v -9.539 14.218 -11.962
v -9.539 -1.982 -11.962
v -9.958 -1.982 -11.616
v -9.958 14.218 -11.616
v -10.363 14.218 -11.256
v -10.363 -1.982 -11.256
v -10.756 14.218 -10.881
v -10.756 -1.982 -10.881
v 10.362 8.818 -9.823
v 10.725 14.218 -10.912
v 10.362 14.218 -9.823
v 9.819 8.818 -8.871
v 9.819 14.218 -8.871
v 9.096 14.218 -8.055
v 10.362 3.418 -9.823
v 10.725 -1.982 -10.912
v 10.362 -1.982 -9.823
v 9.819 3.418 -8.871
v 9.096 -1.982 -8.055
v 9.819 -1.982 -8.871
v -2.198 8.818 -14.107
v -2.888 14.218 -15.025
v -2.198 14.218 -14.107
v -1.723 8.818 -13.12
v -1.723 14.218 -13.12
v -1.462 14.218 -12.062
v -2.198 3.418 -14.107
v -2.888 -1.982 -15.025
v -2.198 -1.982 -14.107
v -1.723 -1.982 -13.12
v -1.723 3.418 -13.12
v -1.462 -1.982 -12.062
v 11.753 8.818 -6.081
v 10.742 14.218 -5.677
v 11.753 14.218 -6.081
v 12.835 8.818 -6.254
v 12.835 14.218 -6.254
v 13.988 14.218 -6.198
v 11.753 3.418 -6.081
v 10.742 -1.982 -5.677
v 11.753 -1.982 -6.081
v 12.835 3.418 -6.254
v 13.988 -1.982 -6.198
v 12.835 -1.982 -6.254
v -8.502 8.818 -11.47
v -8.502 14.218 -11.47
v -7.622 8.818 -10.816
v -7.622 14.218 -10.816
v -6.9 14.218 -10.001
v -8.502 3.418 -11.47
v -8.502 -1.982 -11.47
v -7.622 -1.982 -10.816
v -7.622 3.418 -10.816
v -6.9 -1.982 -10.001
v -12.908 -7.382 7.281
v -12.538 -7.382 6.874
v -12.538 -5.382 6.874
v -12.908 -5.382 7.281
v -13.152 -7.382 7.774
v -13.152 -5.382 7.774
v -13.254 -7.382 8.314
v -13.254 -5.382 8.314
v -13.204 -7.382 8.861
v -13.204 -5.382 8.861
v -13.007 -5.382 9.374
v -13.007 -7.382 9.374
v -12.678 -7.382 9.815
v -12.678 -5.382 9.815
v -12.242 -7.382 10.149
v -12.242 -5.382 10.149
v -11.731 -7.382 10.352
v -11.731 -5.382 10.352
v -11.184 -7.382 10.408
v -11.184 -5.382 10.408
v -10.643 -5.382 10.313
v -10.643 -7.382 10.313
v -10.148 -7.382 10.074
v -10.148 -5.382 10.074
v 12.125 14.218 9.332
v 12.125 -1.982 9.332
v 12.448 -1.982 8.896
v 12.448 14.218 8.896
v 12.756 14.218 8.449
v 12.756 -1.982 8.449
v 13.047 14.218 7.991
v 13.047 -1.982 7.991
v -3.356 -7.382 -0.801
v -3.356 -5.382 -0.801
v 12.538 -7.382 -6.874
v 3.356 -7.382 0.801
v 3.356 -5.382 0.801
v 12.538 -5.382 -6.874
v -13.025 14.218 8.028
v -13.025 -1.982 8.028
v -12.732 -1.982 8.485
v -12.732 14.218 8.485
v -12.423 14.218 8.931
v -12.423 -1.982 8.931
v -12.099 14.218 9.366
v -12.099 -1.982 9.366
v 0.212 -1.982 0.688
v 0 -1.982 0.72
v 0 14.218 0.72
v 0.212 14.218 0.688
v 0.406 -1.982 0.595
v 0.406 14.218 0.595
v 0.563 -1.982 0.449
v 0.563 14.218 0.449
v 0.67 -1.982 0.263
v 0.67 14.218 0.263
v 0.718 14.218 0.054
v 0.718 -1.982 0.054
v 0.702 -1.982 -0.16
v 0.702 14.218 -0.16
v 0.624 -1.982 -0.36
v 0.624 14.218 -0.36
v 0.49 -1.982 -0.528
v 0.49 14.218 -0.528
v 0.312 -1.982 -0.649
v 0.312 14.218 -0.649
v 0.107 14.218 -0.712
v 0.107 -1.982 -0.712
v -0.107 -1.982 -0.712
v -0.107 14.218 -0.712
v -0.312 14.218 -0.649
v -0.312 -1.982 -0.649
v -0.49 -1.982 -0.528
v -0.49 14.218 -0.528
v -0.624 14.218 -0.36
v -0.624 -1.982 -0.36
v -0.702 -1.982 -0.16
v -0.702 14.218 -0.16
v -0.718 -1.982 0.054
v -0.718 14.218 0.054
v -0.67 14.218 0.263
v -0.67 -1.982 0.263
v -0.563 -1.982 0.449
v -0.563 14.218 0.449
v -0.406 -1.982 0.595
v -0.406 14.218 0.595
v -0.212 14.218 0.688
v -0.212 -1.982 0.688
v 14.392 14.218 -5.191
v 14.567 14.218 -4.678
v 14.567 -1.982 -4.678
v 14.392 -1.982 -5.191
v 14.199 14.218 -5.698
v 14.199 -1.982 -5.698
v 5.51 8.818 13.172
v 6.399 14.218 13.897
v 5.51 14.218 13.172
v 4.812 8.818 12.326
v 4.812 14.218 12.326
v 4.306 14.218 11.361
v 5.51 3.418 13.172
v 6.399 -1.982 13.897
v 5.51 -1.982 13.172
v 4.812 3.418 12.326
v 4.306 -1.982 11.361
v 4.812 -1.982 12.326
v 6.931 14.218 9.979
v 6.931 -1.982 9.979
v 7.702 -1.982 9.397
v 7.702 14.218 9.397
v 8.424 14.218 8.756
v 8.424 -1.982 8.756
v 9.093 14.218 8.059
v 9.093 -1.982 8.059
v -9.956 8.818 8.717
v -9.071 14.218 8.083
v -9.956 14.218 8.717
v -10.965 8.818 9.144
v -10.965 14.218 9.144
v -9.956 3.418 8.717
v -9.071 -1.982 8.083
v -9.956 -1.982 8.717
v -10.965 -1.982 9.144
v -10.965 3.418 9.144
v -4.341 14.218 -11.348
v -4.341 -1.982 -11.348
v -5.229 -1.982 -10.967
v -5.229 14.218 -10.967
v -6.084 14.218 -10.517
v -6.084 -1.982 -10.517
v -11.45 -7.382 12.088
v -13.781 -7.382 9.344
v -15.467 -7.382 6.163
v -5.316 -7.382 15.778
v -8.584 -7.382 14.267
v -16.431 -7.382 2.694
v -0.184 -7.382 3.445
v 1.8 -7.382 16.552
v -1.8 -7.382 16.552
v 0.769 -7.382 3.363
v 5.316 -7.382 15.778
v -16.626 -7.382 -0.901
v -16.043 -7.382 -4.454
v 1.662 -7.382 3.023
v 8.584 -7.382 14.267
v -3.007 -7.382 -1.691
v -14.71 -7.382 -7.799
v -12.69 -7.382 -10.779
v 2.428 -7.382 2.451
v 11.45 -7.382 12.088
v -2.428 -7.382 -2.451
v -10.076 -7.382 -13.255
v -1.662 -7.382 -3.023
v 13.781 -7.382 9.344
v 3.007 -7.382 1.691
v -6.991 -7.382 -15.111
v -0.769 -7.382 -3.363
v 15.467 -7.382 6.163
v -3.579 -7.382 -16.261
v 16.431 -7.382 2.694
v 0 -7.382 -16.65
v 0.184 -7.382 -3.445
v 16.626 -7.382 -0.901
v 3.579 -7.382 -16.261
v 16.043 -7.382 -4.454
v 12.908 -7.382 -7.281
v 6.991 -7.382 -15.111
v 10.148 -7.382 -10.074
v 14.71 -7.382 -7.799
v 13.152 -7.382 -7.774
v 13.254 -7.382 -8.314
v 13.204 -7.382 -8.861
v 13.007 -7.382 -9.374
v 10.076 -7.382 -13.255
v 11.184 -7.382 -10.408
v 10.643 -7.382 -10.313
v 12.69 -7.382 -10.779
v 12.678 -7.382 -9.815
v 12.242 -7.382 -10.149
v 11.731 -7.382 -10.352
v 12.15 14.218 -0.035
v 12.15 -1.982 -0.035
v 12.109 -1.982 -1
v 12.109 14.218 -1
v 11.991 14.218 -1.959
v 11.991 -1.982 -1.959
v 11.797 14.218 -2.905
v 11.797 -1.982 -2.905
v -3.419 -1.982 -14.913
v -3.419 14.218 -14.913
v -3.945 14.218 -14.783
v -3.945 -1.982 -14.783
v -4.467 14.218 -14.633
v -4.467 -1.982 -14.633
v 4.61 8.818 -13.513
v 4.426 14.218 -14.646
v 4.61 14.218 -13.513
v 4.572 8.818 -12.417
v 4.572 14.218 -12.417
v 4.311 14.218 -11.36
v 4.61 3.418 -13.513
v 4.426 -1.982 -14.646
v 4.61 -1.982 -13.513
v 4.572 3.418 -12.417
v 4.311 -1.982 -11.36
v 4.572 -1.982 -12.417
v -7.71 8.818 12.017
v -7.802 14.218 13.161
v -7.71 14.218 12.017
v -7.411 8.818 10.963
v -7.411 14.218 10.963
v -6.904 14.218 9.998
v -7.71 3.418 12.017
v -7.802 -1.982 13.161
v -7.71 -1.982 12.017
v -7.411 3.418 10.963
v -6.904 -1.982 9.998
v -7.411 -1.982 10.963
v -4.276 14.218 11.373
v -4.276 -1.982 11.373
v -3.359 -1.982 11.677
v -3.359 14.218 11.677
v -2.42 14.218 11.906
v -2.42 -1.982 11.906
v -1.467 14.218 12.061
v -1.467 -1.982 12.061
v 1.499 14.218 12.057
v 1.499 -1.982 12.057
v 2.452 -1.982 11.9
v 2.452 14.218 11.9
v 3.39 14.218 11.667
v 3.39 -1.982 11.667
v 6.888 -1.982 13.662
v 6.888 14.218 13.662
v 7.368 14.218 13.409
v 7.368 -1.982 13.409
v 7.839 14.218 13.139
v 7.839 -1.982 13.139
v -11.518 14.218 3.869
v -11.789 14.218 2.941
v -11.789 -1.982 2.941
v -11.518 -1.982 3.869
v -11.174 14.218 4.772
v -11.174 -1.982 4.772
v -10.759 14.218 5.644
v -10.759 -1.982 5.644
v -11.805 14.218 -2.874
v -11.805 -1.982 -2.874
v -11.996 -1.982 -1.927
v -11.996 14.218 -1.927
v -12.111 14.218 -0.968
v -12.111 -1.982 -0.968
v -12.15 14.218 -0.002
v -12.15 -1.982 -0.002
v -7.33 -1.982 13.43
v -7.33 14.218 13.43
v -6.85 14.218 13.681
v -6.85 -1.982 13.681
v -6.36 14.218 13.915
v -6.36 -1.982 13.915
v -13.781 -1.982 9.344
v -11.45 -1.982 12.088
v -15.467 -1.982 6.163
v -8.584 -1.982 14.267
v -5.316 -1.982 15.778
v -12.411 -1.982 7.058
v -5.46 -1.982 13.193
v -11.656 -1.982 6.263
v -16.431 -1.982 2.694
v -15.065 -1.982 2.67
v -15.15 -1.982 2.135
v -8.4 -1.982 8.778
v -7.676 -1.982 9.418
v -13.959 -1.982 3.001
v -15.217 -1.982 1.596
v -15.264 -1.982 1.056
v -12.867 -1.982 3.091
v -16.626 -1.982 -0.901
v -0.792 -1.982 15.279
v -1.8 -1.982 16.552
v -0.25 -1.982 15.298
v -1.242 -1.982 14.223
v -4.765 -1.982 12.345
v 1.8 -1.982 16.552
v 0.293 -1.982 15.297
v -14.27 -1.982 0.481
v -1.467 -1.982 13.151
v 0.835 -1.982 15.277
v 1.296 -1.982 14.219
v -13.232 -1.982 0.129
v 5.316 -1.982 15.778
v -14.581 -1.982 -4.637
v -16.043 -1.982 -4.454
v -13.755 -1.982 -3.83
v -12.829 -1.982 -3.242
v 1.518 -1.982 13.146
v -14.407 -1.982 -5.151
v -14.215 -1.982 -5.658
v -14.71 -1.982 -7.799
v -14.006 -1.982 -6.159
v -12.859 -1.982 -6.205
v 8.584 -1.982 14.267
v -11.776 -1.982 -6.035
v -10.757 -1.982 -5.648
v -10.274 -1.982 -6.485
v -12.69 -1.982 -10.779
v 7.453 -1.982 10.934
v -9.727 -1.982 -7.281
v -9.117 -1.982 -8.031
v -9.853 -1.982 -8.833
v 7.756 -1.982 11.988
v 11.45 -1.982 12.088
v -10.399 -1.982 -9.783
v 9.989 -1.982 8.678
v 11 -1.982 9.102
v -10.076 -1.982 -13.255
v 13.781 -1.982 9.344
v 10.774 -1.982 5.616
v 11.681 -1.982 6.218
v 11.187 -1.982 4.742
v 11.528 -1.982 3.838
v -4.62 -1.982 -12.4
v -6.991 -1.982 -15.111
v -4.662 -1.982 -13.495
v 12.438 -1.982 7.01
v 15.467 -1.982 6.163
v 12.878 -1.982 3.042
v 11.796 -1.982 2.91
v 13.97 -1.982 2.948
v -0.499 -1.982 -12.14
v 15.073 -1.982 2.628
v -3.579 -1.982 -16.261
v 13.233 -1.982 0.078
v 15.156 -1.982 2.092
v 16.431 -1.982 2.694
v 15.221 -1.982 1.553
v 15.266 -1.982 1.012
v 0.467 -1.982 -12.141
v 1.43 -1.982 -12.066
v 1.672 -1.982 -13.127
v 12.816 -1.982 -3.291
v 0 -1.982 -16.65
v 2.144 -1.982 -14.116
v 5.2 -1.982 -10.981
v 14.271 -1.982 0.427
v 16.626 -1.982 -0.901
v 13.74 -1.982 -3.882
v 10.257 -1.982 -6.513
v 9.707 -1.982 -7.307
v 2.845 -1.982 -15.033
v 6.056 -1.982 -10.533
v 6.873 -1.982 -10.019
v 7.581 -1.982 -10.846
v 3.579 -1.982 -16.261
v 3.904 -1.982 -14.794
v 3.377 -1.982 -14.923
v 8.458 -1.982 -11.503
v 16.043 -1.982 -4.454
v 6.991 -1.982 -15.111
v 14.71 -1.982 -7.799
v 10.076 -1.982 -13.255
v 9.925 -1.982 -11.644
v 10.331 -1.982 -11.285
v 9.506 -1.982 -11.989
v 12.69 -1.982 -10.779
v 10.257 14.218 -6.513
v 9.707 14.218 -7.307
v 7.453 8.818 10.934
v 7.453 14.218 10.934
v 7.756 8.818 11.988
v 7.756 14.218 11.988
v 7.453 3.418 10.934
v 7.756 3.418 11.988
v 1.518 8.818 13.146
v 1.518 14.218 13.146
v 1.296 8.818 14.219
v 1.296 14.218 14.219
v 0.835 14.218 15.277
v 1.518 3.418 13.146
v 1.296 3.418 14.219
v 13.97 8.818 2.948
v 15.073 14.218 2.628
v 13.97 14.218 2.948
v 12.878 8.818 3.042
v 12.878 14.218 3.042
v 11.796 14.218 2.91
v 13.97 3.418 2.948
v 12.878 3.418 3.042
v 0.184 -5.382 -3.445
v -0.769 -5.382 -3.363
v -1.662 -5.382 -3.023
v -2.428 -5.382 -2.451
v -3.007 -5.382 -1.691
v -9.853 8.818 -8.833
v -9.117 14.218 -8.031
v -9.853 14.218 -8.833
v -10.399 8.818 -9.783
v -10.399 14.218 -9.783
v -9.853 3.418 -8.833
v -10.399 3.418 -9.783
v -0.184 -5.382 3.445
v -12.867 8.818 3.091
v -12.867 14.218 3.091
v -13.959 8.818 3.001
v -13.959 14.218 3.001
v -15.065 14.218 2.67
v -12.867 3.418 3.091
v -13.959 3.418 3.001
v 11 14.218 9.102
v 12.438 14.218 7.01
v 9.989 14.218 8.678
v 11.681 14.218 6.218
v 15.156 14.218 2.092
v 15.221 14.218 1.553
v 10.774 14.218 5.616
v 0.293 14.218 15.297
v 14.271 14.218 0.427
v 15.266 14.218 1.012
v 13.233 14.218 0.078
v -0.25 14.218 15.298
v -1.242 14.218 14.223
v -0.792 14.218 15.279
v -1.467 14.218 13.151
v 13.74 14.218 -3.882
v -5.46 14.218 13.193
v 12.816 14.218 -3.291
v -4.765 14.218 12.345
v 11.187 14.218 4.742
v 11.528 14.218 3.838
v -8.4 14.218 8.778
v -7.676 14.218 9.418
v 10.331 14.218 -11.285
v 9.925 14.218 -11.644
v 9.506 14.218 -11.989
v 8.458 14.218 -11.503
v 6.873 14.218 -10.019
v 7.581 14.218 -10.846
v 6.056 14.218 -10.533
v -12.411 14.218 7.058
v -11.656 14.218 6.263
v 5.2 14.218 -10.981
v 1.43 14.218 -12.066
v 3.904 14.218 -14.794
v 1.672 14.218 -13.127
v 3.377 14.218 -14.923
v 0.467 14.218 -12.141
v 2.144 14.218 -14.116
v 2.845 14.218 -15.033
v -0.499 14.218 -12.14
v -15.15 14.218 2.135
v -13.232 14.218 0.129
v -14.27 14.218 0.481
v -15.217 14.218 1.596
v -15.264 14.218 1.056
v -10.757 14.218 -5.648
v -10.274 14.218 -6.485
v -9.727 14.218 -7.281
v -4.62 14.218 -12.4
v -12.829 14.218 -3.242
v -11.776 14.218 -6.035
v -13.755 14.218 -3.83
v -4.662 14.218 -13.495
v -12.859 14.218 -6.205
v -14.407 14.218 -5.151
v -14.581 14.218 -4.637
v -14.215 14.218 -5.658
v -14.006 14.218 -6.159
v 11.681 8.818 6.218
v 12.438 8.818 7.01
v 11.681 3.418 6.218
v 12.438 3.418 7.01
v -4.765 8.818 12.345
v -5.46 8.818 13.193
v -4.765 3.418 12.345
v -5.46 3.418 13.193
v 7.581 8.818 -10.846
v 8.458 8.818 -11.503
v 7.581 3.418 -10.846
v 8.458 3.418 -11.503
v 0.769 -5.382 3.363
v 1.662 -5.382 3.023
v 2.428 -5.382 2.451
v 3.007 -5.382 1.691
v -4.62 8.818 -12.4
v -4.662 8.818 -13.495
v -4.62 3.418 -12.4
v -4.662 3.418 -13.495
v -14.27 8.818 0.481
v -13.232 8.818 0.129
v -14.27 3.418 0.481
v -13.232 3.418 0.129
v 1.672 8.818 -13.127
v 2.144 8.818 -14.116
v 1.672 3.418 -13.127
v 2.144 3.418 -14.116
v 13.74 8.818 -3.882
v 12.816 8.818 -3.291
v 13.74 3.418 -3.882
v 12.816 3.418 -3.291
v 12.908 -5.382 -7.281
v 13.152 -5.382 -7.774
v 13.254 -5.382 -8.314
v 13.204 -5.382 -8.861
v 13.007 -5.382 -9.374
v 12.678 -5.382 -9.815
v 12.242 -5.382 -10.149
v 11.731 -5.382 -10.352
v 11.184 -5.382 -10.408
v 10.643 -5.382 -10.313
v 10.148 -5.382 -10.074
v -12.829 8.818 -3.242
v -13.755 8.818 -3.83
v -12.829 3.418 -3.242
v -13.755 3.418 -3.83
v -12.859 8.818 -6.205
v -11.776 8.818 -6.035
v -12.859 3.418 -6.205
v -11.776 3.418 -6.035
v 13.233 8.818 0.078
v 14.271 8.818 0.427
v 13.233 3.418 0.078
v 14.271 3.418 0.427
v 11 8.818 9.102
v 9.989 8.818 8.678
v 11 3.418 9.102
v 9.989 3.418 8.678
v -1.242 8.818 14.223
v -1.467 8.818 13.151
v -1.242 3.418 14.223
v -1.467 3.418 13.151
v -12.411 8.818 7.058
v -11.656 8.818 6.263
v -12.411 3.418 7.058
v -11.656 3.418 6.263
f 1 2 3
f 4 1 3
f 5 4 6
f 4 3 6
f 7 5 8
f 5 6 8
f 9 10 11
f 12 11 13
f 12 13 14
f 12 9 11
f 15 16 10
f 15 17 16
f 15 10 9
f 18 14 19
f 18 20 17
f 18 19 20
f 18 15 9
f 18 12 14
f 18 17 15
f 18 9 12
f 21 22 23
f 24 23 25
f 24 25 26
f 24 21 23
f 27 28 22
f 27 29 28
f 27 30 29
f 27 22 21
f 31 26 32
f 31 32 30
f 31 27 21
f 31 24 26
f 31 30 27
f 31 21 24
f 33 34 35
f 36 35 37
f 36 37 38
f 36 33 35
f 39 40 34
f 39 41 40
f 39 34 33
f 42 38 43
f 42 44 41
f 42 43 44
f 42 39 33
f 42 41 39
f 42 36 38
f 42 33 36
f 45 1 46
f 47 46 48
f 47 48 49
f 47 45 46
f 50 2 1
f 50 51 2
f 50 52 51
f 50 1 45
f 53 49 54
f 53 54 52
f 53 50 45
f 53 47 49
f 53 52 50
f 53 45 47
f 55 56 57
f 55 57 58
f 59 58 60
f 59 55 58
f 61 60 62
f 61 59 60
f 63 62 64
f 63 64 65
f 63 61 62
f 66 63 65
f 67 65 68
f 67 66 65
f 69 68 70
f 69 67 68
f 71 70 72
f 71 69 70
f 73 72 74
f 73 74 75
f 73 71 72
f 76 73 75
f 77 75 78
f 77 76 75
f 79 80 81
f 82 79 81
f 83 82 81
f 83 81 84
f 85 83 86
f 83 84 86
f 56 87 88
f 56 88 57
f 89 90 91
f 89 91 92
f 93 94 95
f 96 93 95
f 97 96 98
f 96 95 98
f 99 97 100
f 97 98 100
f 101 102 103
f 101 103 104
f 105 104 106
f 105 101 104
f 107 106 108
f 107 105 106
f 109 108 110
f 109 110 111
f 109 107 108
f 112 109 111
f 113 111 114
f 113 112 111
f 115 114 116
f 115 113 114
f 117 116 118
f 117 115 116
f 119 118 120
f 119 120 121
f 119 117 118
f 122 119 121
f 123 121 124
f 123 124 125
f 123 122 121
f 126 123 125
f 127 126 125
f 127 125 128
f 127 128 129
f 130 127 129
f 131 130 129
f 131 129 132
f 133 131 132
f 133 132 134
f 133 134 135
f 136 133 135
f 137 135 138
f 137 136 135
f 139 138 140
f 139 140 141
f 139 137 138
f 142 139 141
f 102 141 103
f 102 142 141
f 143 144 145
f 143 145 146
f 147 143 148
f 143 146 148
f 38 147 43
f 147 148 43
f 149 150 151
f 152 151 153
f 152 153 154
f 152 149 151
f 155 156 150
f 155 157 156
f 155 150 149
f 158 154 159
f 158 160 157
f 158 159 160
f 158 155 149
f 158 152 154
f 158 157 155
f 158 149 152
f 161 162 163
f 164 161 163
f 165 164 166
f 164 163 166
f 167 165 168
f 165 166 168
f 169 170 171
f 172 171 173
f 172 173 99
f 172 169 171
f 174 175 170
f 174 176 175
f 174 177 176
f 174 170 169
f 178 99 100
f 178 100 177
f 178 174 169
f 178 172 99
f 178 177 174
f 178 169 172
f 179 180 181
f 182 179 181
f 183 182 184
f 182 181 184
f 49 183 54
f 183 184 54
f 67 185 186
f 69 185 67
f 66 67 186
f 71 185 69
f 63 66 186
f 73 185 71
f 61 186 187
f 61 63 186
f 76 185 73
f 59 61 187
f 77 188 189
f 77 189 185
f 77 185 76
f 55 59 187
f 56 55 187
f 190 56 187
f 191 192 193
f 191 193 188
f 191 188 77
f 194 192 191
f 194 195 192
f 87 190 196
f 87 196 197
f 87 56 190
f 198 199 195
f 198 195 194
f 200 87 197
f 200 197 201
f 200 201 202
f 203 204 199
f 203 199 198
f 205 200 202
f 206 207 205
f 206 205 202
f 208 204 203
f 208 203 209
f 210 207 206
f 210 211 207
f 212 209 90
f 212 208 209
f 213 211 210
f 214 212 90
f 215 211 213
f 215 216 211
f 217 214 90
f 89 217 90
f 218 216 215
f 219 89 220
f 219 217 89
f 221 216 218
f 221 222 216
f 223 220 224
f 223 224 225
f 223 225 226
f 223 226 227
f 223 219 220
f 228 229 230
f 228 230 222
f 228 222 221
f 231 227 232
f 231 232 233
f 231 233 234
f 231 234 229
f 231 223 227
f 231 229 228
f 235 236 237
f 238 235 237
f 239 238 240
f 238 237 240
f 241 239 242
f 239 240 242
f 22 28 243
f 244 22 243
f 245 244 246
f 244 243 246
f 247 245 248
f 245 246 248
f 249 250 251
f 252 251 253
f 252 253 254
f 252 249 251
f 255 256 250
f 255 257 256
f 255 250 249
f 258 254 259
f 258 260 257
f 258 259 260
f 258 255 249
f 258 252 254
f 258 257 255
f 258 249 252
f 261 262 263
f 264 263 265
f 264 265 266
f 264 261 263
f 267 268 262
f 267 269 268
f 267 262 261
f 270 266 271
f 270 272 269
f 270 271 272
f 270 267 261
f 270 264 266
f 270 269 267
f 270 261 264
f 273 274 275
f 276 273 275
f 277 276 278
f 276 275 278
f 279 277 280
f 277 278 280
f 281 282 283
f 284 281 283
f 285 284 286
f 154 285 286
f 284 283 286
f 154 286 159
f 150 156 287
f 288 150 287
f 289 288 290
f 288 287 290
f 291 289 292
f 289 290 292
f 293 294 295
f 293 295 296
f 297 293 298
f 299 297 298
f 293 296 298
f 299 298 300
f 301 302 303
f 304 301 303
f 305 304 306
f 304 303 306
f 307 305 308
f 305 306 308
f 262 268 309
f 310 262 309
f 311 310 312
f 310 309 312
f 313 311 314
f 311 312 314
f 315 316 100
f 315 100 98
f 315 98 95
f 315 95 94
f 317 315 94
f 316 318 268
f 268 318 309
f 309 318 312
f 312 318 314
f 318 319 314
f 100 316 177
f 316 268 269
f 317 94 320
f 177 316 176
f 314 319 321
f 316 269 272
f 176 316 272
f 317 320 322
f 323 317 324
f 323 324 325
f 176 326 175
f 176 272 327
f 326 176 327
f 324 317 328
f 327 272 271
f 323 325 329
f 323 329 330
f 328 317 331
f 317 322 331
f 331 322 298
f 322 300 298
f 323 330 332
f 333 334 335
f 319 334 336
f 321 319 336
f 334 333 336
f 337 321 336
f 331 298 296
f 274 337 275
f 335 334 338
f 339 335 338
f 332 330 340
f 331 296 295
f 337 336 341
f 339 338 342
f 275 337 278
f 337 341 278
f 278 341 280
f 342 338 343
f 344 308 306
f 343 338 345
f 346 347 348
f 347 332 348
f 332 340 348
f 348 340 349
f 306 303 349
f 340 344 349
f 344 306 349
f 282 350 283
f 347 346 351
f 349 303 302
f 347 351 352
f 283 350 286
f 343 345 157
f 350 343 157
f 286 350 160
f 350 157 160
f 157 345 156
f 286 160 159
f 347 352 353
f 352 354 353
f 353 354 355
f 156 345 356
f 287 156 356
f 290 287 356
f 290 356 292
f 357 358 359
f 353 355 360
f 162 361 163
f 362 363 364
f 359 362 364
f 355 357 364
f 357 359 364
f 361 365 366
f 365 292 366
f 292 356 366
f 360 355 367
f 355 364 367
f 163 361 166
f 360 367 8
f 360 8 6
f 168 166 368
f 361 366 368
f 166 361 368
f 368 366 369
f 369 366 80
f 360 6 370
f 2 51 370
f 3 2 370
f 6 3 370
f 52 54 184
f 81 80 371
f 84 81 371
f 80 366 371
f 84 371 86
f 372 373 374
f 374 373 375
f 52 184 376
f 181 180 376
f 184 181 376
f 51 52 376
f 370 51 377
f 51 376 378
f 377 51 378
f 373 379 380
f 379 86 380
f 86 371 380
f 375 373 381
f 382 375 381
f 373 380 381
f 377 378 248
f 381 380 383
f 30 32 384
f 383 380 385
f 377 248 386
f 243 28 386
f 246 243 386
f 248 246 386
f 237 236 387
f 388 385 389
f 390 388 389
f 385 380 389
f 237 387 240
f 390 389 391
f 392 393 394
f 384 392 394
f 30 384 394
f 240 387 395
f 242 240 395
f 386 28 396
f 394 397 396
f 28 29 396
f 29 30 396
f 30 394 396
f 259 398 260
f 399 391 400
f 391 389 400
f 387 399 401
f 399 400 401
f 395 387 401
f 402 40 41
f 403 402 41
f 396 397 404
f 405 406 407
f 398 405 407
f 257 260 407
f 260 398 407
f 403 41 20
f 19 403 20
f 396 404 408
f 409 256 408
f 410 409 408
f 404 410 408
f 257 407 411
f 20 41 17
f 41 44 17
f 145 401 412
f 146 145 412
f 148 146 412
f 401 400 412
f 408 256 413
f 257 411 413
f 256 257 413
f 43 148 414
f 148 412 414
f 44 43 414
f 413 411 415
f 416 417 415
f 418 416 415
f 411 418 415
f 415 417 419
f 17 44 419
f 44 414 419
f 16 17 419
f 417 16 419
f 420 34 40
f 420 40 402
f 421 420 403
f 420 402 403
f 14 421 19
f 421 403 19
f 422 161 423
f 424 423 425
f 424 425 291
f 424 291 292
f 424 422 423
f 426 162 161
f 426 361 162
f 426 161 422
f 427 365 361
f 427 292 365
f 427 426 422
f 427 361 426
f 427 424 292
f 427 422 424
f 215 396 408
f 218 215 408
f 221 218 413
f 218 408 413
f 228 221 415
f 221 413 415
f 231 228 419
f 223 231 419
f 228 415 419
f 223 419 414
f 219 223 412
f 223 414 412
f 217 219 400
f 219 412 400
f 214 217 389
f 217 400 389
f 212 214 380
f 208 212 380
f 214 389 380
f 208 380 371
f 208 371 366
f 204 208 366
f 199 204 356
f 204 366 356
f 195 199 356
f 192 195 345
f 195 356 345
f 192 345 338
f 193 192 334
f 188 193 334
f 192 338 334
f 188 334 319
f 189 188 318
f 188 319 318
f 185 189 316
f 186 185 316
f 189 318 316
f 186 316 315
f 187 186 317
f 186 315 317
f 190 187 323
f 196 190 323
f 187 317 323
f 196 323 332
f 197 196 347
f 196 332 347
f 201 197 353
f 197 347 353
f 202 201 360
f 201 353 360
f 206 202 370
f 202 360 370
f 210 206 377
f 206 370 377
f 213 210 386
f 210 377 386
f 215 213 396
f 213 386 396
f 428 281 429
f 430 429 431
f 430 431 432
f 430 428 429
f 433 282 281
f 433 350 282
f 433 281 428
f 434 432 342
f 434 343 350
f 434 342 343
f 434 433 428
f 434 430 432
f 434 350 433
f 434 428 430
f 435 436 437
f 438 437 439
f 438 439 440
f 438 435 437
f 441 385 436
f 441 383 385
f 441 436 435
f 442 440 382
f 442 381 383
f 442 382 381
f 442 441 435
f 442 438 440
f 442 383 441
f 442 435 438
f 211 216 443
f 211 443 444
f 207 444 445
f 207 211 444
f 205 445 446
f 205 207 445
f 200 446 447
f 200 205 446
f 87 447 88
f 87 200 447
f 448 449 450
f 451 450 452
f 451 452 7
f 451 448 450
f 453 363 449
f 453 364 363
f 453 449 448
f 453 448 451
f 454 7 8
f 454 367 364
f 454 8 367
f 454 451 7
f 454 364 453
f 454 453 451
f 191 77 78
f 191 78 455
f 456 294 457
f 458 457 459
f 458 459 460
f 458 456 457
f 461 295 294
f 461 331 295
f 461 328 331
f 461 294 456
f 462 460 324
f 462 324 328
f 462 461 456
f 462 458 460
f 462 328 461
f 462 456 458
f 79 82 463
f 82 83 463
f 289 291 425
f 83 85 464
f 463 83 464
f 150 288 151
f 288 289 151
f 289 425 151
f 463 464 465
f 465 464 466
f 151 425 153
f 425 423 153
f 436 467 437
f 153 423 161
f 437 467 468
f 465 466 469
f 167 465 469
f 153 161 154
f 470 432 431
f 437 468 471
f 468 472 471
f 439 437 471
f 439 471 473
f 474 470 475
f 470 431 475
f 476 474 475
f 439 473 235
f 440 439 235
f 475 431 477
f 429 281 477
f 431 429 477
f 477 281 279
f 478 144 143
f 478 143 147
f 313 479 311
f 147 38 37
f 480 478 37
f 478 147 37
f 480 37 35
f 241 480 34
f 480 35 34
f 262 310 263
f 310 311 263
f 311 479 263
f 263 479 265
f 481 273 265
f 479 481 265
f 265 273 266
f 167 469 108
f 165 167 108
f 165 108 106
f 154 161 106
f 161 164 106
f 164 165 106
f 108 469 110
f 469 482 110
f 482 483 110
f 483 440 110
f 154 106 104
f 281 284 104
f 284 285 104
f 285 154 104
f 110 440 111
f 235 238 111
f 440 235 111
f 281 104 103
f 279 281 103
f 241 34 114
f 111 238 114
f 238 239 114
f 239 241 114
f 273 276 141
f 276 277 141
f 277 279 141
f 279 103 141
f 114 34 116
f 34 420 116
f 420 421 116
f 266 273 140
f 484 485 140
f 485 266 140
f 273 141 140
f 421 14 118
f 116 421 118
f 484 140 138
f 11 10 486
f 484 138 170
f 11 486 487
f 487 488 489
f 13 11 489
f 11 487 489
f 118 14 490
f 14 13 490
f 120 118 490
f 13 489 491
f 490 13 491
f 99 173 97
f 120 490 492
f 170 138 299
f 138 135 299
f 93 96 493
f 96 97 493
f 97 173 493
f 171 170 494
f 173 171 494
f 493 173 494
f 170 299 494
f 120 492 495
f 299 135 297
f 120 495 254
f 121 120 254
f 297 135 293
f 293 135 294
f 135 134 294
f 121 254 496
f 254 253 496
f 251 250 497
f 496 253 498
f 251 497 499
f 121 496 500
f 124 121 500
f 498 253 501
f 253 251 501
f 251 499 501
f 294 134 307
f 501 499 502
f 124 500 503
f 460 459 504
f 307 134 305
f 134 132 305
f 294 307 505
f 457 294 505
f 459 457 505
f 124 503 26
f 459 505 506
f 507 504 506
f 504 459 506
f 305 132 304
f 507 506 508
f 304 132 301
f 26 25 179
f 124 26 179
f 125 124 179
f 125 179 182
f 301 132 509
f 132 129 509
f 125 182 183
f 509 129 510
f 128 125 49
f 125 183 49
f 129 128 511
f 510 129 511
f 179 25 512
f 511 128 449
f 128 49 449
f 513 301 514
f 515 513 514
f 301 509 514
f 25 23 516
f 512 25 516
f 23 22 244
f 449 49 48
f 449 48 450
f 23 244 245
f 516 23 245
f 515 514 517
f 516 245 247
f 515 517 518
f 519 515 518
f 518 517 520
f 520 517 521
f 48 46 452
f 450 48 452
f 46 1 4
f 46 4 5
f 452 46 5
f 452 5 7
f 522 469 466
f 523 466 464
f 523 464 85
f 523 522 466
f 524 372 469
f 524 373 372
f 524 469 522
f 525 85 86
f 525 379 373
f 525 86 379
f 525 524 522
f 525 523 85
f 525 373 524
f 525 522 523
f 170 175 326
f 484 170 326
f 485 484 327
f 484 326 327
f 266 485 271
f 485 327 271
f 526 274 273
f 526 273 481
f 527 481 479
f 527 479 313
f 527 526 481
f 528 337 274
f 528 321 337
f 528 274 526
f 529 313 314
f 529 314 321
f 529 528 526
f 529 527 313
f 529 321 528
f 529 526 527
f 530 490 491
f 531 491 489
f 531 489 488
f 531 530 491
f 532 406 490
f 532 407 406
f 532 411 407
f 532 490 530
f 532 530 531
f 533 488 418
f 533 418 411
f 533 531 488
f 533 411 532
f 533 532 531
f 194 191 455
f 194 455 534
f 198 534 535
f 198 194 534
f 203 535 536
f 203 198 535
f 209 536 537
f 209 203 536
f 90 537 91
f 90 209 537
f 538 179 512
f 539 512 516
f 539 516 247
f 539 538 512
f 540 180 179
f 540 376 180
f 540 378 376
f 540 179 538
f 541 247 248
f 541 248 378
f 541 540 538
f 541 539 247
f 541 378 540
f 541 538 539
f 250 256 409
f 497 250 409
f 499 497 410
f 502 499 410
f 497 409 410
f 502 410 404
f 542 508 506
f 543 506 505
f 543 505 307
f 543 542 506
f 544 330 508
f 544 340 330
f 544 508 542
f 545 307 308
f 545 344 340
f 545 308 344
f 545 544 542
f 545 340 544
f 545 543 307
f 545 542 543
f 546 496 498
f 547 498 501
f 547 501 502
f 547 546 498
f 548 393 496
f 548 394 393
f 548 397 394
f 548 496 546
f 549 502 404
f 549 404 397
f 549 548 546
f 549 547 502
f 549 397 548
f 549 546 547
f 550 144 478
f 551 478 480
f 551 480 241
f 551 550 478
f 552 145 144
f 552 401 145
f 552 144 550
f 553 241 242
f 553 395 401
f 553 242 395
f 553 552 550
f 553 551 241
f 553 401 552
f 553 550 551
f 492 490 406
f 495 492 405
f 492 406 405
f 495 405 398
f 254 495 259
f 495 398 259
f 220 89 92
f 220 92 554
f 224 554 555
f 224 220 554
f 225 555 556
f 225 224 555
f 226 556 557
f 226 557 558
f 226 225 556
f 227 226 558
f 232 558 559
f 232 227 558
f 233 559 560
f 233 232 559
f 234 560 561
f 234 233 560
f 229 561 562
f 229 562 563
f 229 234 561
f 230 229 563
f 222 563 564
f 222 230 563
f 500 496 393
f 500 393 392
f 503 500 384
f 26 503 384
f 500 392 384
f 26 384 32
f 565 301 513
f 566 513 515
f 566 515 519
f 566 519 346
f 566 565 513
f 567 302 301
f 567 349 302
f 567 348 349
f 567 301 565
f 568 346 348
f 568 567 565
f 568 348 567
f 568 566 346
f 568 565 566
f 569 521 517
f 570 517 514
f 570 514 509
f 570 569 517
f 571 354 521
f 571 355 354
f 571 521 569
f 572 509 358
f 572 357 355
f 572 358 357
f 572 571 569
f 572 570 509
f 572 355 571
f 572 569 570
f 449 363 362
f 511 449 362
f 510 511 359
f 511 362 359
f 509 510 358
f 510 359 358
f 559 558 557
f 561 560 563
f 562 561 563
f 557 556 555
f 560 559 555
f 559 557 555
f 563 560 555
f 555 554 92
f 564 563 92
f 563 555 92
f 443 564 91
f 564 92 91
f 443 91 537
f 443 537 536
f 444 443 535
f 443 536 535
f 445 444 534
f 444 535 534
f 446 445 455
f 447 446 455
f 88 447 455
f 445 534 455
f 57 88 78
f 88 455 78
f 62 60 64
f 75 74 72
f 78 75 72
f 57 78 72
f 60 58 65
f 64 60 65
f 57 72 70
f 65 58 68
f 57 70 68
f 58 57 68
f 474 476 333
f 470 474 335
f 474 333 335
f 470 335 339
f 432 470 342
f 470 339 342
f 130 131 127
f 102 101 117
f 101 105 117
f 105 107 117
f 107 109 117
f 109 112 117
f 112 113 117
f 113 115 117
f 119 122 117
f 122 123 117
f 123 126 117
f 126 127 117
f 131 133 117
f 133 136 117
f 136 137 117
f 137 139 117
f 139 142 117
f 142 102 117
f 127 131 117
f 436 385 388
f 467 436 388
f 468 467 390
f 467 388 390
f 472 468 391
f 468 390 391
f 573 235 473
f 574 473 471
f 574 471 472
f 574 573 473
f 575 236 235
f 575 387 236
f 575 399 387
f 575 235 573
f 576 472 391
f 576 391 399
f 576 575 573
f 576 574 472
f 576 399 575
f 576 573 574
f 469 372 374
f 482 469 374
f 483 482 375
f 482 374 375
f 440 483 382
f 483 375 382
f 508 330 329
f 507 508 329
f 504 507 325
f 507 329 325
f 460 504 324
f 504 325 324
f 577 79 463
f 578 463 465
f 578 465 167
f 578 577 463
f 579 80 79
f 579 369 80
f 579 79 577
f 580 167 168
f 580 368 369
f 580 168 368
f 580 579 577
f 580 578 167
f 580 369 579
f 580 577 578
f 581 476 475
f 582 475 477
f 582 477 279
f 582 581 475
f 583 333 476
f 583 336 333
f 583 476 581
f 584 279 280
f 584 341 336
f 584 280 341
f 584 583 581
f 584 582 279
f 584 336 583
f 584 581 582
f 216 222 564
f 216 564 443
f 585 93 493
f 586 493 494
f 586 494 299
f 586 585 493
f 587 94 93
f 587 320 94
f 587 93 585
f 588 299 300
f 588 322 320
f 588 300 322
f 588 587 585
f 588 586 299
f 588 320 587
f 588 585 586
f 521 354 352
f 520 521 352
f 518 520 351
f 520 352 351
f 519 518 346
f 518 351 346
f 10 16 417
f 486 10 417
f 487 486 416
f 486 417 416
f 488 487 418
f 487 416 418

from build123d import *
from OCP.BRepAlgoAPI import BRepAlgoAPI_Cut
from OCP.TopTools import TopTools_ListOfShape

# Parameters (mm, degrees)
SKETCH1_R           = 0.4
BOSS_EXTRUDE1_DEPTH = 9
SKETCH2_R           = 9.25
BOSS_EXTRUDE2_DEPTH = 3
SCALE1_SCALE        = 1.8
CUT_EXTRUDE1_DEPTH  = 2


with BuildPart() as part:
    # Sketch1 → Boss-Extrude1 (new body)
    with BuildSketch(Plane(origin=(0, 0, 0), x_dir=(1, 0, 0), z_dir=(0, 1, 0))):
        with BuildLine():
            add(Edge.make_bspline(
                [(-5.065227978, 4.461610195), (-5.526615005, 4.86619147), (-5.830003112, 5.39406146), (-5.975392301, 6.045220165)],
                knots=[0, 0, 0, 0, 0.872429449, 0.872429449, 0.872429449, 0.872429449], degree=3))
            ThreePointArc((-5.065227978, 4.461610195), (-5.560258819, 3.827012132), (-5.976238464, 3.138004752))
            add(Edge.make_bspline(
                [(-7.780961116, 3.42149735), (-7.125870497, 3.507536778), (-6.52429628, 3.413039245), (-5.976238464, 3.138004752)],
                knots=[0.127683247, 0.127683247, 0.127683247, 0.127683247, 1, 1, 1, 1], degree=3))
            ThreePointArc((-7.780961116, 3.42149735), (-7.951879756, 3.00293329), (-8.10030101, 2.575873357))
            add(Edge.make_bspline(
                [(-6.558450277, 1.596630818), (-7.155006493, 1.740452504), (-7.668956737, 2.066866683), (-8.10030101, 2.575873357)],
                knots=[0, 0, 0, 0, 0.872429449, 0.872429449, 0.872429449, 0.872429449], degree=3))
            ThreePointArc((-6.558450277, 1.596630818), (-6.701865893, 0.804669837), (-6.749999881, 0.00126872))
            add(Edge.make_bspline(
                [(-8.479748007, -0.586407486), (-7.939678588, -0.205787566), (-7.363095879, -0.009895497), (-6.749999881, 0.00126872)],
                knots=[0.127683247, 0.127683247, 0.127683247, 0.127683247, 1, 1, 1, 1], degree=3))
            ThreePointArc((-8.479748007, -0.586407486), (-8.436572529, -1.036457408), (-8.369528376, -1.483574994))
            add(Edge.make_bspline(
                [(-6.549210655, -1.634117437), (-7.144272221, -1.784003157), (-7.751044795, -1.733822342), (-8.369528376, -1.483574994)],
                knots=[0, 0, 0, 0, 0.872429449, 0.872429449, 0.872429449, 0.872429449], degree=3))
            ThreePointArc((-6.549210655, -1.634117437), (-6.308156258, -2.402012621), (-5.977417671, -3.13575796))
            add(Edge.make_bspline(
                [(-7.235926822, -4.459973434), (-6.934601997, -3.871968458), (-6.515098947, -3.4305633), (-5.977417671, -3.13575796)],
                knots=[0.127683247, 0.127683247, 0.127683247, 0.127683247, 1, 1, 1, 1], degree=3))
            ThreePointArc((-7.235926822, -4.459973434), (-6.988548208, -4.838408204), (-6.721397655, -5.203154193))
            add(Edge.make_bspline(
                [(-5.039625799, -4.490509081), (-5.496871281, -4.899765193), (-6.0574619, -5.137313564), (-6.721397655, -5.203154193)],
                knots=[0, 0, 0, 0, 0.872429449, 0.872429449, 0.872429449, 0.872429449], degree=3))
            ThreePointArc((-5.039625799, -4.490509081), (-4.469324045, -5.058422935), (-3.835481109, -5.554420281))
            add(Edge.make_bspline(
                [(-4.334442004, -7.311813216), (-4.34089166, -6.651128039), (-4.174571361, -6.065330394), (-3.835481109, -5.554420281)],
                knots=[0.127683247, 0.127683247, 0.127683247, 0.127683247, 1, 1, 1, 1], degree=3))
            ThreePointArc((-4.334442004, -7.311813216), (-3.939531713, -7.53193799), (-3.533475733, -7.730753472))
            add(Edge.make_bspline(
                [(-2.375523406, -6.318179211), (-2.590203375, -6.893050073), (-2.976187484, -7.36390816), (-3.533475733, -7.730753472)],
                knots=[0, 0, 0, 0, 0.872429449, 0.872429449, 0.872429449, 0.872429449], degree=3))
            ThreePointArc((-2.375523406, -6.318179211), (-1.606623554, -6.556009515), (-0.814882047, -6.700631854))
            add(Edge.make_bspline(
                [(-0.439988759, -8.488604708), (-0.752735357, -7.906594341), (-0.877699786, -7.31060339), (-0.814882047, -6.700631854)],
                knots=[0.127683247, 0.127683247, 0.127683247, 0.127683247, 1, 1, 1, 1], degree=3))
            ThreePointArc((-0.439988759, -8.488604708), (0.011984021, -8.499991552), (0.463922896, -8.487330296))
            add(Edge.make_bspline(
                [(0.832782771, -6.698430626), (0.909848909, -7.307220251), (0.786895617, -7.903520141), (0.463922896, -8.487330296)],
                knots=[0, 0, 0, 0, 0.872429449, 0.872429449, 0.872429449, 0.872429449], degree=3))
            ThreePointArc((0.832782771, -6.698430626), (1.624135031, -6.551693323), (2.392396671, -6.311809421))
            add(Edge.make_bspline(
                [(3.555260608, -7.72075916), (3.007863545, -7.350755165), (2.620242233, -6.881105252), (2.392396671, -6.311809421)],
                knots=[0.127683247, 0.127683247, 0.127683247, 0.127683247, 1, 1, 1, 1], degree=3))
            ThreePointArc((3.555260608, -7.72075916), (3.96075436, -7.520799485), (4.355042381, -7.299562032))
            add(Edge.make_bspline(
                [(3.850308451, -5.54415231), (4.201465773, -6.047394331), (4.369710416, -6.632530905), (4.355042381, -7.299562032)],
                knots=[0, 0, 0, 0, 0.872429449, 0.872429449, 0.872429449, 0.872429449], degree=3))
            ThreePointArc((3.850308451, -5.54415231), (4.482823853, -5.046463148), (5.051606144, -4.477027515))
            add(Edge.make_bspline(
                [(6.736042616, -5.184180734), (6.079397157, -5.110946566), (5.517918333, -4.875228826), (5.051606144, -4.477027515)],
                knots=[0.127683247, 0.127683247, 0.127683247, 0.127683247, 1, 1, 1, 1], degree=3))
            ThreePointArc((6.736042616, -5.184180734), (7.002163607, -4.818682892), (7.24847414, -4.439552076))
            add(Edge.make_bspline(
                [(5.985774866, -3.119775513), (6.530577461, -3.402183249), (6.951477219, -3.84210877), (7.24847414, -4.439552076)],
                knots=[0, 0, 0, 0, 0.872429449, 0.872429449, 0.872429449, 0.872429449], degree=3))
            ThreePointArc((5.985774866, -3.119775513), (6.314551754, -2.385149082), (6.553553527, -1.616612559))
            add(Edge.make_bspline(
                [(8.373678438, -1.459968977), (7.758214146, -1.700281702), (7.151505842, -1.75249623), (6.553553527, -1.616612559)],
                knots=[0.127683247, 0.127683247, 0.127683247, 0.127683247, 1, 1, 1, 1], degree=3))
            ThreePointArc((8.373678438, -1.459968977), (8.439461558, -1.01266412), (8.481367828, -0.562494242))
            add(Edge.make_bspline(
                [(6.749972396, 0.019304256), (7.363612555, 0.022427015), (7.940744366, -0.171505818), (8.481367828, -0.562494242)],
                knots=[0, 0, 0, 0, 0.872429449, 0.872429449, 0.872429449, 0.872429449], degree=3))
            ThreePointArc((6.749972396, 0.019304256), (6.699691947, 0.822573894), (6.554160776, 1.614148852))
            add(Edge.make_bspline(
                [(8.093005444, 2.598704077), (7.65971777, 2.099897208), (7.146769547, 1.771712133), (6.554160776, 1.614148852)],
                knots=[0.127683247, 0.127683247, 0.127683247, 0.127683247, 1, 1, 1, 1], degree=3))
            ThreePointArc((8.093005444, 2.598704077), (7.943380571, 3.025343799), (7.771282357, 3.443424244))
            add(Edge.make_bspline(
                [(5.967832596, 3.153961653), (6.509732754, 3.44189952), (7.110882674, 3.53838705), (7.771282357, 3.443424244)],
                knots=[0, 0, 0, 0, 0.872429449, 0.872429449, 0.872429449, 0.872429449], degree=3))
            ThreePointArc((5.967832596, 3.153961653), (5.550013455, 3.841855105), (5.053288778, 4.475128213))
            add(Edge.make_bspline(
                [(5.958322434, 6.062045345), (5.806472362, 5.419014975), (5.504794477, 4.890042598), (5.053288778, 4.475128213)],
                knots=[0.127683247, 0.127683247, 0.127683247, 0.127683247, 1, 1, 1, 1], degree=3))
            ThreePointArc((5.958322434, 6.062045345), (5.627566824, 6.370281912), (5.280889753, 6.660495734))
            add(Edge.make_bspline(
                [(3.818534268, 5.566084444), (4.16455163, 6.072874324), (4.652003458, 6.437678087), (5.280889753, 6.660495734)],
                knots=[0, 0, 0, 0, 0.872429449, 0.872429449, 0.872429449, 0.872429449], degree=3))
            ThreePointArc((3.818534268, 5.566084444), (3.128893766, 5.98101361), (2.394769219, 6.310909632))
            add(Edge.make_bspline(
                [(2.45865956, 8.136645081), (2.623034112, 7.496701718), (2.601737332, 6.888123235), (2.394769219, 6.310909632)],
                knots=[0.127683247, 0.127683247, 0.127683247, 0.127683247, 1, 1, 1, 1], degree=3))
            ThreePointArc((2.45865956, 8.136645081), (2.022545337, 8.25586521), (1.580708948, 8.351727918))
            add(Edge.make_bspline(
                [(0.794455758, 6.703084368), (0.865321915, 7.312626807), (1.127406312, 7.862174657), (1.580708948, 8.351727918)],
                knots=[0, 0, 0, 0, 0.872429449, 0.872429449, 0.872429449, 0.872429449], degree=3))
            ThreePointArc((0.794455758, 6.703084368), (-0.009017778, 6.749993976), (-0.812363108, 6.700937709))
            add(Edge.make_bspline(
                [(-1.604252589, 8.347237485), (-1.161309642, 7.856984441), (-0.897346481, 7.308217849), (-0.812363108, 6.700937709)],
                knots=[0.127683247, 0.127683247, 0.127683247, 0.127683247, 1, 1, 1, 1], degree=3))
            ThreePointArc((-1.604252589, 8.347237485), (-2.045816912, 8.250129282), (-2.481593228, 8.129679886))
            add(Edge.make_bspline(
                [(-2.411622992, 6.304488444), (-2.632142622, 6.877144615), (-2.655466033, 7.485541762), (-2.481593228, 8.129679886)],
                knots=[0, 0, 0, 0, 0.872429449, 0.872429449, 0.872429449, 0.872429449], degree=3))
            ThreePointArc((-2.411622992, 6.304488444), (-3.144863458, 5.972632069), (-3.833392837, 5.555861712))
            add(Edge.make_bspline(
                [(-5.299649804, 6.645578377), (-4.679611352, 6.417326717), (-4.19085903, 6.054087828), (-3.833392837, 5.555861712)],
                knots=[0.127683247, 0.127683247, 0.127683247, 0.127683247, 1, 1, 1, 1], degree=3))
            ThreePointArc((-5.299649804, 6.645578377), (-5.645507162, 6.35438816), (-5.975392301, 6.045220165))
        make_face()
        Circle(SKETCH1_R, mode=Mode.SUBTRACT)
    extrude(amount=BOSS_EXTRUDE1_DEPTH)

    # Sketch2 → Boss-Extrude2 (add)
    with BuildSketch(Plane.XZ):
        Circle(SKETCH2_R)
    extrude(amount=BOSS_EXTRUDE2_DEPTH)


with BuildPart() as part_1:
    # Scale1: scaled about (0, 2.477742253, 0)
    add(part.part.scale(SCALE1_SCALE).moved(Location((0, -1.982193802, 0))))


with BuildPart() as cut_extrude1_tool:
    # Sketch3 → Cut-Extrude1 (new body)
    with BuildSketch(Plane.XZ.offset(7.382189851)):
        with BuildLine():
            Line((-10.14806543, 10.074005921), (-0.183742843, 3.445103564))
            ThreePointArc((-0.183742843, 3.445103564), (2.064801156, 2.763891493), (3.355756213, 0.800874672))
            Line((3.355756213, 0.800874672), (12.53847182, -6.874267357))
            ThreePointArc((12.53847182, -6.874267357), (12.858103903, -9.605814074), (10.14806543, -10.074005921))
            Line((10.14806543, -10.074005921), (0.183742843, -3.445103564))
            ThreePointArc((0.183742843, -3.445103564), (-2.064801156, -2.763891493), (-3.355756213, -0.800874672))
            Line((-3.355756213, -0.800874672), (-12.53847182, 6.874267357))
            ThreePointArc((-12.53847182, 6.874267357), (-12.858103903, 9.605814074), (-10.14806543, 10.074005921))
        make_face()
    extrude(amount=-CUT_EXTRUDE1_DEPTH)


with BuildPart() as part_2:
    add(part_1.part)

    # Cut-Extrude1: cut by cut_extrude1_tool, with a tolerance
    cut_extrude1_stock = TopTools_ListOfShape()
    cut_extrude1_stock.Append(part_2.part.wrapped)
    cut_extrude1_tools = TopTools_ListOfShape()
    cut_extrude1_tools.Append(cut_extrude1_tool.part.wrapped)
    cut_extrude1_cut = BRepAlgoAPI_Cut()
    cut_extrude1_cut.SetArguments(cut_extrude1_stock)
    cut_extrude1_cut.SetTools(cut_extrude1_tools)
    cut_extrude1_cut.SetFuzzyValue(0.00001)
    cut_extrude1_cut.Build()
    add(Compound.cast(cut_extrude1_cut.Shape()).solids(), mode=Mode.REPLACE)


solid = part_2.part
